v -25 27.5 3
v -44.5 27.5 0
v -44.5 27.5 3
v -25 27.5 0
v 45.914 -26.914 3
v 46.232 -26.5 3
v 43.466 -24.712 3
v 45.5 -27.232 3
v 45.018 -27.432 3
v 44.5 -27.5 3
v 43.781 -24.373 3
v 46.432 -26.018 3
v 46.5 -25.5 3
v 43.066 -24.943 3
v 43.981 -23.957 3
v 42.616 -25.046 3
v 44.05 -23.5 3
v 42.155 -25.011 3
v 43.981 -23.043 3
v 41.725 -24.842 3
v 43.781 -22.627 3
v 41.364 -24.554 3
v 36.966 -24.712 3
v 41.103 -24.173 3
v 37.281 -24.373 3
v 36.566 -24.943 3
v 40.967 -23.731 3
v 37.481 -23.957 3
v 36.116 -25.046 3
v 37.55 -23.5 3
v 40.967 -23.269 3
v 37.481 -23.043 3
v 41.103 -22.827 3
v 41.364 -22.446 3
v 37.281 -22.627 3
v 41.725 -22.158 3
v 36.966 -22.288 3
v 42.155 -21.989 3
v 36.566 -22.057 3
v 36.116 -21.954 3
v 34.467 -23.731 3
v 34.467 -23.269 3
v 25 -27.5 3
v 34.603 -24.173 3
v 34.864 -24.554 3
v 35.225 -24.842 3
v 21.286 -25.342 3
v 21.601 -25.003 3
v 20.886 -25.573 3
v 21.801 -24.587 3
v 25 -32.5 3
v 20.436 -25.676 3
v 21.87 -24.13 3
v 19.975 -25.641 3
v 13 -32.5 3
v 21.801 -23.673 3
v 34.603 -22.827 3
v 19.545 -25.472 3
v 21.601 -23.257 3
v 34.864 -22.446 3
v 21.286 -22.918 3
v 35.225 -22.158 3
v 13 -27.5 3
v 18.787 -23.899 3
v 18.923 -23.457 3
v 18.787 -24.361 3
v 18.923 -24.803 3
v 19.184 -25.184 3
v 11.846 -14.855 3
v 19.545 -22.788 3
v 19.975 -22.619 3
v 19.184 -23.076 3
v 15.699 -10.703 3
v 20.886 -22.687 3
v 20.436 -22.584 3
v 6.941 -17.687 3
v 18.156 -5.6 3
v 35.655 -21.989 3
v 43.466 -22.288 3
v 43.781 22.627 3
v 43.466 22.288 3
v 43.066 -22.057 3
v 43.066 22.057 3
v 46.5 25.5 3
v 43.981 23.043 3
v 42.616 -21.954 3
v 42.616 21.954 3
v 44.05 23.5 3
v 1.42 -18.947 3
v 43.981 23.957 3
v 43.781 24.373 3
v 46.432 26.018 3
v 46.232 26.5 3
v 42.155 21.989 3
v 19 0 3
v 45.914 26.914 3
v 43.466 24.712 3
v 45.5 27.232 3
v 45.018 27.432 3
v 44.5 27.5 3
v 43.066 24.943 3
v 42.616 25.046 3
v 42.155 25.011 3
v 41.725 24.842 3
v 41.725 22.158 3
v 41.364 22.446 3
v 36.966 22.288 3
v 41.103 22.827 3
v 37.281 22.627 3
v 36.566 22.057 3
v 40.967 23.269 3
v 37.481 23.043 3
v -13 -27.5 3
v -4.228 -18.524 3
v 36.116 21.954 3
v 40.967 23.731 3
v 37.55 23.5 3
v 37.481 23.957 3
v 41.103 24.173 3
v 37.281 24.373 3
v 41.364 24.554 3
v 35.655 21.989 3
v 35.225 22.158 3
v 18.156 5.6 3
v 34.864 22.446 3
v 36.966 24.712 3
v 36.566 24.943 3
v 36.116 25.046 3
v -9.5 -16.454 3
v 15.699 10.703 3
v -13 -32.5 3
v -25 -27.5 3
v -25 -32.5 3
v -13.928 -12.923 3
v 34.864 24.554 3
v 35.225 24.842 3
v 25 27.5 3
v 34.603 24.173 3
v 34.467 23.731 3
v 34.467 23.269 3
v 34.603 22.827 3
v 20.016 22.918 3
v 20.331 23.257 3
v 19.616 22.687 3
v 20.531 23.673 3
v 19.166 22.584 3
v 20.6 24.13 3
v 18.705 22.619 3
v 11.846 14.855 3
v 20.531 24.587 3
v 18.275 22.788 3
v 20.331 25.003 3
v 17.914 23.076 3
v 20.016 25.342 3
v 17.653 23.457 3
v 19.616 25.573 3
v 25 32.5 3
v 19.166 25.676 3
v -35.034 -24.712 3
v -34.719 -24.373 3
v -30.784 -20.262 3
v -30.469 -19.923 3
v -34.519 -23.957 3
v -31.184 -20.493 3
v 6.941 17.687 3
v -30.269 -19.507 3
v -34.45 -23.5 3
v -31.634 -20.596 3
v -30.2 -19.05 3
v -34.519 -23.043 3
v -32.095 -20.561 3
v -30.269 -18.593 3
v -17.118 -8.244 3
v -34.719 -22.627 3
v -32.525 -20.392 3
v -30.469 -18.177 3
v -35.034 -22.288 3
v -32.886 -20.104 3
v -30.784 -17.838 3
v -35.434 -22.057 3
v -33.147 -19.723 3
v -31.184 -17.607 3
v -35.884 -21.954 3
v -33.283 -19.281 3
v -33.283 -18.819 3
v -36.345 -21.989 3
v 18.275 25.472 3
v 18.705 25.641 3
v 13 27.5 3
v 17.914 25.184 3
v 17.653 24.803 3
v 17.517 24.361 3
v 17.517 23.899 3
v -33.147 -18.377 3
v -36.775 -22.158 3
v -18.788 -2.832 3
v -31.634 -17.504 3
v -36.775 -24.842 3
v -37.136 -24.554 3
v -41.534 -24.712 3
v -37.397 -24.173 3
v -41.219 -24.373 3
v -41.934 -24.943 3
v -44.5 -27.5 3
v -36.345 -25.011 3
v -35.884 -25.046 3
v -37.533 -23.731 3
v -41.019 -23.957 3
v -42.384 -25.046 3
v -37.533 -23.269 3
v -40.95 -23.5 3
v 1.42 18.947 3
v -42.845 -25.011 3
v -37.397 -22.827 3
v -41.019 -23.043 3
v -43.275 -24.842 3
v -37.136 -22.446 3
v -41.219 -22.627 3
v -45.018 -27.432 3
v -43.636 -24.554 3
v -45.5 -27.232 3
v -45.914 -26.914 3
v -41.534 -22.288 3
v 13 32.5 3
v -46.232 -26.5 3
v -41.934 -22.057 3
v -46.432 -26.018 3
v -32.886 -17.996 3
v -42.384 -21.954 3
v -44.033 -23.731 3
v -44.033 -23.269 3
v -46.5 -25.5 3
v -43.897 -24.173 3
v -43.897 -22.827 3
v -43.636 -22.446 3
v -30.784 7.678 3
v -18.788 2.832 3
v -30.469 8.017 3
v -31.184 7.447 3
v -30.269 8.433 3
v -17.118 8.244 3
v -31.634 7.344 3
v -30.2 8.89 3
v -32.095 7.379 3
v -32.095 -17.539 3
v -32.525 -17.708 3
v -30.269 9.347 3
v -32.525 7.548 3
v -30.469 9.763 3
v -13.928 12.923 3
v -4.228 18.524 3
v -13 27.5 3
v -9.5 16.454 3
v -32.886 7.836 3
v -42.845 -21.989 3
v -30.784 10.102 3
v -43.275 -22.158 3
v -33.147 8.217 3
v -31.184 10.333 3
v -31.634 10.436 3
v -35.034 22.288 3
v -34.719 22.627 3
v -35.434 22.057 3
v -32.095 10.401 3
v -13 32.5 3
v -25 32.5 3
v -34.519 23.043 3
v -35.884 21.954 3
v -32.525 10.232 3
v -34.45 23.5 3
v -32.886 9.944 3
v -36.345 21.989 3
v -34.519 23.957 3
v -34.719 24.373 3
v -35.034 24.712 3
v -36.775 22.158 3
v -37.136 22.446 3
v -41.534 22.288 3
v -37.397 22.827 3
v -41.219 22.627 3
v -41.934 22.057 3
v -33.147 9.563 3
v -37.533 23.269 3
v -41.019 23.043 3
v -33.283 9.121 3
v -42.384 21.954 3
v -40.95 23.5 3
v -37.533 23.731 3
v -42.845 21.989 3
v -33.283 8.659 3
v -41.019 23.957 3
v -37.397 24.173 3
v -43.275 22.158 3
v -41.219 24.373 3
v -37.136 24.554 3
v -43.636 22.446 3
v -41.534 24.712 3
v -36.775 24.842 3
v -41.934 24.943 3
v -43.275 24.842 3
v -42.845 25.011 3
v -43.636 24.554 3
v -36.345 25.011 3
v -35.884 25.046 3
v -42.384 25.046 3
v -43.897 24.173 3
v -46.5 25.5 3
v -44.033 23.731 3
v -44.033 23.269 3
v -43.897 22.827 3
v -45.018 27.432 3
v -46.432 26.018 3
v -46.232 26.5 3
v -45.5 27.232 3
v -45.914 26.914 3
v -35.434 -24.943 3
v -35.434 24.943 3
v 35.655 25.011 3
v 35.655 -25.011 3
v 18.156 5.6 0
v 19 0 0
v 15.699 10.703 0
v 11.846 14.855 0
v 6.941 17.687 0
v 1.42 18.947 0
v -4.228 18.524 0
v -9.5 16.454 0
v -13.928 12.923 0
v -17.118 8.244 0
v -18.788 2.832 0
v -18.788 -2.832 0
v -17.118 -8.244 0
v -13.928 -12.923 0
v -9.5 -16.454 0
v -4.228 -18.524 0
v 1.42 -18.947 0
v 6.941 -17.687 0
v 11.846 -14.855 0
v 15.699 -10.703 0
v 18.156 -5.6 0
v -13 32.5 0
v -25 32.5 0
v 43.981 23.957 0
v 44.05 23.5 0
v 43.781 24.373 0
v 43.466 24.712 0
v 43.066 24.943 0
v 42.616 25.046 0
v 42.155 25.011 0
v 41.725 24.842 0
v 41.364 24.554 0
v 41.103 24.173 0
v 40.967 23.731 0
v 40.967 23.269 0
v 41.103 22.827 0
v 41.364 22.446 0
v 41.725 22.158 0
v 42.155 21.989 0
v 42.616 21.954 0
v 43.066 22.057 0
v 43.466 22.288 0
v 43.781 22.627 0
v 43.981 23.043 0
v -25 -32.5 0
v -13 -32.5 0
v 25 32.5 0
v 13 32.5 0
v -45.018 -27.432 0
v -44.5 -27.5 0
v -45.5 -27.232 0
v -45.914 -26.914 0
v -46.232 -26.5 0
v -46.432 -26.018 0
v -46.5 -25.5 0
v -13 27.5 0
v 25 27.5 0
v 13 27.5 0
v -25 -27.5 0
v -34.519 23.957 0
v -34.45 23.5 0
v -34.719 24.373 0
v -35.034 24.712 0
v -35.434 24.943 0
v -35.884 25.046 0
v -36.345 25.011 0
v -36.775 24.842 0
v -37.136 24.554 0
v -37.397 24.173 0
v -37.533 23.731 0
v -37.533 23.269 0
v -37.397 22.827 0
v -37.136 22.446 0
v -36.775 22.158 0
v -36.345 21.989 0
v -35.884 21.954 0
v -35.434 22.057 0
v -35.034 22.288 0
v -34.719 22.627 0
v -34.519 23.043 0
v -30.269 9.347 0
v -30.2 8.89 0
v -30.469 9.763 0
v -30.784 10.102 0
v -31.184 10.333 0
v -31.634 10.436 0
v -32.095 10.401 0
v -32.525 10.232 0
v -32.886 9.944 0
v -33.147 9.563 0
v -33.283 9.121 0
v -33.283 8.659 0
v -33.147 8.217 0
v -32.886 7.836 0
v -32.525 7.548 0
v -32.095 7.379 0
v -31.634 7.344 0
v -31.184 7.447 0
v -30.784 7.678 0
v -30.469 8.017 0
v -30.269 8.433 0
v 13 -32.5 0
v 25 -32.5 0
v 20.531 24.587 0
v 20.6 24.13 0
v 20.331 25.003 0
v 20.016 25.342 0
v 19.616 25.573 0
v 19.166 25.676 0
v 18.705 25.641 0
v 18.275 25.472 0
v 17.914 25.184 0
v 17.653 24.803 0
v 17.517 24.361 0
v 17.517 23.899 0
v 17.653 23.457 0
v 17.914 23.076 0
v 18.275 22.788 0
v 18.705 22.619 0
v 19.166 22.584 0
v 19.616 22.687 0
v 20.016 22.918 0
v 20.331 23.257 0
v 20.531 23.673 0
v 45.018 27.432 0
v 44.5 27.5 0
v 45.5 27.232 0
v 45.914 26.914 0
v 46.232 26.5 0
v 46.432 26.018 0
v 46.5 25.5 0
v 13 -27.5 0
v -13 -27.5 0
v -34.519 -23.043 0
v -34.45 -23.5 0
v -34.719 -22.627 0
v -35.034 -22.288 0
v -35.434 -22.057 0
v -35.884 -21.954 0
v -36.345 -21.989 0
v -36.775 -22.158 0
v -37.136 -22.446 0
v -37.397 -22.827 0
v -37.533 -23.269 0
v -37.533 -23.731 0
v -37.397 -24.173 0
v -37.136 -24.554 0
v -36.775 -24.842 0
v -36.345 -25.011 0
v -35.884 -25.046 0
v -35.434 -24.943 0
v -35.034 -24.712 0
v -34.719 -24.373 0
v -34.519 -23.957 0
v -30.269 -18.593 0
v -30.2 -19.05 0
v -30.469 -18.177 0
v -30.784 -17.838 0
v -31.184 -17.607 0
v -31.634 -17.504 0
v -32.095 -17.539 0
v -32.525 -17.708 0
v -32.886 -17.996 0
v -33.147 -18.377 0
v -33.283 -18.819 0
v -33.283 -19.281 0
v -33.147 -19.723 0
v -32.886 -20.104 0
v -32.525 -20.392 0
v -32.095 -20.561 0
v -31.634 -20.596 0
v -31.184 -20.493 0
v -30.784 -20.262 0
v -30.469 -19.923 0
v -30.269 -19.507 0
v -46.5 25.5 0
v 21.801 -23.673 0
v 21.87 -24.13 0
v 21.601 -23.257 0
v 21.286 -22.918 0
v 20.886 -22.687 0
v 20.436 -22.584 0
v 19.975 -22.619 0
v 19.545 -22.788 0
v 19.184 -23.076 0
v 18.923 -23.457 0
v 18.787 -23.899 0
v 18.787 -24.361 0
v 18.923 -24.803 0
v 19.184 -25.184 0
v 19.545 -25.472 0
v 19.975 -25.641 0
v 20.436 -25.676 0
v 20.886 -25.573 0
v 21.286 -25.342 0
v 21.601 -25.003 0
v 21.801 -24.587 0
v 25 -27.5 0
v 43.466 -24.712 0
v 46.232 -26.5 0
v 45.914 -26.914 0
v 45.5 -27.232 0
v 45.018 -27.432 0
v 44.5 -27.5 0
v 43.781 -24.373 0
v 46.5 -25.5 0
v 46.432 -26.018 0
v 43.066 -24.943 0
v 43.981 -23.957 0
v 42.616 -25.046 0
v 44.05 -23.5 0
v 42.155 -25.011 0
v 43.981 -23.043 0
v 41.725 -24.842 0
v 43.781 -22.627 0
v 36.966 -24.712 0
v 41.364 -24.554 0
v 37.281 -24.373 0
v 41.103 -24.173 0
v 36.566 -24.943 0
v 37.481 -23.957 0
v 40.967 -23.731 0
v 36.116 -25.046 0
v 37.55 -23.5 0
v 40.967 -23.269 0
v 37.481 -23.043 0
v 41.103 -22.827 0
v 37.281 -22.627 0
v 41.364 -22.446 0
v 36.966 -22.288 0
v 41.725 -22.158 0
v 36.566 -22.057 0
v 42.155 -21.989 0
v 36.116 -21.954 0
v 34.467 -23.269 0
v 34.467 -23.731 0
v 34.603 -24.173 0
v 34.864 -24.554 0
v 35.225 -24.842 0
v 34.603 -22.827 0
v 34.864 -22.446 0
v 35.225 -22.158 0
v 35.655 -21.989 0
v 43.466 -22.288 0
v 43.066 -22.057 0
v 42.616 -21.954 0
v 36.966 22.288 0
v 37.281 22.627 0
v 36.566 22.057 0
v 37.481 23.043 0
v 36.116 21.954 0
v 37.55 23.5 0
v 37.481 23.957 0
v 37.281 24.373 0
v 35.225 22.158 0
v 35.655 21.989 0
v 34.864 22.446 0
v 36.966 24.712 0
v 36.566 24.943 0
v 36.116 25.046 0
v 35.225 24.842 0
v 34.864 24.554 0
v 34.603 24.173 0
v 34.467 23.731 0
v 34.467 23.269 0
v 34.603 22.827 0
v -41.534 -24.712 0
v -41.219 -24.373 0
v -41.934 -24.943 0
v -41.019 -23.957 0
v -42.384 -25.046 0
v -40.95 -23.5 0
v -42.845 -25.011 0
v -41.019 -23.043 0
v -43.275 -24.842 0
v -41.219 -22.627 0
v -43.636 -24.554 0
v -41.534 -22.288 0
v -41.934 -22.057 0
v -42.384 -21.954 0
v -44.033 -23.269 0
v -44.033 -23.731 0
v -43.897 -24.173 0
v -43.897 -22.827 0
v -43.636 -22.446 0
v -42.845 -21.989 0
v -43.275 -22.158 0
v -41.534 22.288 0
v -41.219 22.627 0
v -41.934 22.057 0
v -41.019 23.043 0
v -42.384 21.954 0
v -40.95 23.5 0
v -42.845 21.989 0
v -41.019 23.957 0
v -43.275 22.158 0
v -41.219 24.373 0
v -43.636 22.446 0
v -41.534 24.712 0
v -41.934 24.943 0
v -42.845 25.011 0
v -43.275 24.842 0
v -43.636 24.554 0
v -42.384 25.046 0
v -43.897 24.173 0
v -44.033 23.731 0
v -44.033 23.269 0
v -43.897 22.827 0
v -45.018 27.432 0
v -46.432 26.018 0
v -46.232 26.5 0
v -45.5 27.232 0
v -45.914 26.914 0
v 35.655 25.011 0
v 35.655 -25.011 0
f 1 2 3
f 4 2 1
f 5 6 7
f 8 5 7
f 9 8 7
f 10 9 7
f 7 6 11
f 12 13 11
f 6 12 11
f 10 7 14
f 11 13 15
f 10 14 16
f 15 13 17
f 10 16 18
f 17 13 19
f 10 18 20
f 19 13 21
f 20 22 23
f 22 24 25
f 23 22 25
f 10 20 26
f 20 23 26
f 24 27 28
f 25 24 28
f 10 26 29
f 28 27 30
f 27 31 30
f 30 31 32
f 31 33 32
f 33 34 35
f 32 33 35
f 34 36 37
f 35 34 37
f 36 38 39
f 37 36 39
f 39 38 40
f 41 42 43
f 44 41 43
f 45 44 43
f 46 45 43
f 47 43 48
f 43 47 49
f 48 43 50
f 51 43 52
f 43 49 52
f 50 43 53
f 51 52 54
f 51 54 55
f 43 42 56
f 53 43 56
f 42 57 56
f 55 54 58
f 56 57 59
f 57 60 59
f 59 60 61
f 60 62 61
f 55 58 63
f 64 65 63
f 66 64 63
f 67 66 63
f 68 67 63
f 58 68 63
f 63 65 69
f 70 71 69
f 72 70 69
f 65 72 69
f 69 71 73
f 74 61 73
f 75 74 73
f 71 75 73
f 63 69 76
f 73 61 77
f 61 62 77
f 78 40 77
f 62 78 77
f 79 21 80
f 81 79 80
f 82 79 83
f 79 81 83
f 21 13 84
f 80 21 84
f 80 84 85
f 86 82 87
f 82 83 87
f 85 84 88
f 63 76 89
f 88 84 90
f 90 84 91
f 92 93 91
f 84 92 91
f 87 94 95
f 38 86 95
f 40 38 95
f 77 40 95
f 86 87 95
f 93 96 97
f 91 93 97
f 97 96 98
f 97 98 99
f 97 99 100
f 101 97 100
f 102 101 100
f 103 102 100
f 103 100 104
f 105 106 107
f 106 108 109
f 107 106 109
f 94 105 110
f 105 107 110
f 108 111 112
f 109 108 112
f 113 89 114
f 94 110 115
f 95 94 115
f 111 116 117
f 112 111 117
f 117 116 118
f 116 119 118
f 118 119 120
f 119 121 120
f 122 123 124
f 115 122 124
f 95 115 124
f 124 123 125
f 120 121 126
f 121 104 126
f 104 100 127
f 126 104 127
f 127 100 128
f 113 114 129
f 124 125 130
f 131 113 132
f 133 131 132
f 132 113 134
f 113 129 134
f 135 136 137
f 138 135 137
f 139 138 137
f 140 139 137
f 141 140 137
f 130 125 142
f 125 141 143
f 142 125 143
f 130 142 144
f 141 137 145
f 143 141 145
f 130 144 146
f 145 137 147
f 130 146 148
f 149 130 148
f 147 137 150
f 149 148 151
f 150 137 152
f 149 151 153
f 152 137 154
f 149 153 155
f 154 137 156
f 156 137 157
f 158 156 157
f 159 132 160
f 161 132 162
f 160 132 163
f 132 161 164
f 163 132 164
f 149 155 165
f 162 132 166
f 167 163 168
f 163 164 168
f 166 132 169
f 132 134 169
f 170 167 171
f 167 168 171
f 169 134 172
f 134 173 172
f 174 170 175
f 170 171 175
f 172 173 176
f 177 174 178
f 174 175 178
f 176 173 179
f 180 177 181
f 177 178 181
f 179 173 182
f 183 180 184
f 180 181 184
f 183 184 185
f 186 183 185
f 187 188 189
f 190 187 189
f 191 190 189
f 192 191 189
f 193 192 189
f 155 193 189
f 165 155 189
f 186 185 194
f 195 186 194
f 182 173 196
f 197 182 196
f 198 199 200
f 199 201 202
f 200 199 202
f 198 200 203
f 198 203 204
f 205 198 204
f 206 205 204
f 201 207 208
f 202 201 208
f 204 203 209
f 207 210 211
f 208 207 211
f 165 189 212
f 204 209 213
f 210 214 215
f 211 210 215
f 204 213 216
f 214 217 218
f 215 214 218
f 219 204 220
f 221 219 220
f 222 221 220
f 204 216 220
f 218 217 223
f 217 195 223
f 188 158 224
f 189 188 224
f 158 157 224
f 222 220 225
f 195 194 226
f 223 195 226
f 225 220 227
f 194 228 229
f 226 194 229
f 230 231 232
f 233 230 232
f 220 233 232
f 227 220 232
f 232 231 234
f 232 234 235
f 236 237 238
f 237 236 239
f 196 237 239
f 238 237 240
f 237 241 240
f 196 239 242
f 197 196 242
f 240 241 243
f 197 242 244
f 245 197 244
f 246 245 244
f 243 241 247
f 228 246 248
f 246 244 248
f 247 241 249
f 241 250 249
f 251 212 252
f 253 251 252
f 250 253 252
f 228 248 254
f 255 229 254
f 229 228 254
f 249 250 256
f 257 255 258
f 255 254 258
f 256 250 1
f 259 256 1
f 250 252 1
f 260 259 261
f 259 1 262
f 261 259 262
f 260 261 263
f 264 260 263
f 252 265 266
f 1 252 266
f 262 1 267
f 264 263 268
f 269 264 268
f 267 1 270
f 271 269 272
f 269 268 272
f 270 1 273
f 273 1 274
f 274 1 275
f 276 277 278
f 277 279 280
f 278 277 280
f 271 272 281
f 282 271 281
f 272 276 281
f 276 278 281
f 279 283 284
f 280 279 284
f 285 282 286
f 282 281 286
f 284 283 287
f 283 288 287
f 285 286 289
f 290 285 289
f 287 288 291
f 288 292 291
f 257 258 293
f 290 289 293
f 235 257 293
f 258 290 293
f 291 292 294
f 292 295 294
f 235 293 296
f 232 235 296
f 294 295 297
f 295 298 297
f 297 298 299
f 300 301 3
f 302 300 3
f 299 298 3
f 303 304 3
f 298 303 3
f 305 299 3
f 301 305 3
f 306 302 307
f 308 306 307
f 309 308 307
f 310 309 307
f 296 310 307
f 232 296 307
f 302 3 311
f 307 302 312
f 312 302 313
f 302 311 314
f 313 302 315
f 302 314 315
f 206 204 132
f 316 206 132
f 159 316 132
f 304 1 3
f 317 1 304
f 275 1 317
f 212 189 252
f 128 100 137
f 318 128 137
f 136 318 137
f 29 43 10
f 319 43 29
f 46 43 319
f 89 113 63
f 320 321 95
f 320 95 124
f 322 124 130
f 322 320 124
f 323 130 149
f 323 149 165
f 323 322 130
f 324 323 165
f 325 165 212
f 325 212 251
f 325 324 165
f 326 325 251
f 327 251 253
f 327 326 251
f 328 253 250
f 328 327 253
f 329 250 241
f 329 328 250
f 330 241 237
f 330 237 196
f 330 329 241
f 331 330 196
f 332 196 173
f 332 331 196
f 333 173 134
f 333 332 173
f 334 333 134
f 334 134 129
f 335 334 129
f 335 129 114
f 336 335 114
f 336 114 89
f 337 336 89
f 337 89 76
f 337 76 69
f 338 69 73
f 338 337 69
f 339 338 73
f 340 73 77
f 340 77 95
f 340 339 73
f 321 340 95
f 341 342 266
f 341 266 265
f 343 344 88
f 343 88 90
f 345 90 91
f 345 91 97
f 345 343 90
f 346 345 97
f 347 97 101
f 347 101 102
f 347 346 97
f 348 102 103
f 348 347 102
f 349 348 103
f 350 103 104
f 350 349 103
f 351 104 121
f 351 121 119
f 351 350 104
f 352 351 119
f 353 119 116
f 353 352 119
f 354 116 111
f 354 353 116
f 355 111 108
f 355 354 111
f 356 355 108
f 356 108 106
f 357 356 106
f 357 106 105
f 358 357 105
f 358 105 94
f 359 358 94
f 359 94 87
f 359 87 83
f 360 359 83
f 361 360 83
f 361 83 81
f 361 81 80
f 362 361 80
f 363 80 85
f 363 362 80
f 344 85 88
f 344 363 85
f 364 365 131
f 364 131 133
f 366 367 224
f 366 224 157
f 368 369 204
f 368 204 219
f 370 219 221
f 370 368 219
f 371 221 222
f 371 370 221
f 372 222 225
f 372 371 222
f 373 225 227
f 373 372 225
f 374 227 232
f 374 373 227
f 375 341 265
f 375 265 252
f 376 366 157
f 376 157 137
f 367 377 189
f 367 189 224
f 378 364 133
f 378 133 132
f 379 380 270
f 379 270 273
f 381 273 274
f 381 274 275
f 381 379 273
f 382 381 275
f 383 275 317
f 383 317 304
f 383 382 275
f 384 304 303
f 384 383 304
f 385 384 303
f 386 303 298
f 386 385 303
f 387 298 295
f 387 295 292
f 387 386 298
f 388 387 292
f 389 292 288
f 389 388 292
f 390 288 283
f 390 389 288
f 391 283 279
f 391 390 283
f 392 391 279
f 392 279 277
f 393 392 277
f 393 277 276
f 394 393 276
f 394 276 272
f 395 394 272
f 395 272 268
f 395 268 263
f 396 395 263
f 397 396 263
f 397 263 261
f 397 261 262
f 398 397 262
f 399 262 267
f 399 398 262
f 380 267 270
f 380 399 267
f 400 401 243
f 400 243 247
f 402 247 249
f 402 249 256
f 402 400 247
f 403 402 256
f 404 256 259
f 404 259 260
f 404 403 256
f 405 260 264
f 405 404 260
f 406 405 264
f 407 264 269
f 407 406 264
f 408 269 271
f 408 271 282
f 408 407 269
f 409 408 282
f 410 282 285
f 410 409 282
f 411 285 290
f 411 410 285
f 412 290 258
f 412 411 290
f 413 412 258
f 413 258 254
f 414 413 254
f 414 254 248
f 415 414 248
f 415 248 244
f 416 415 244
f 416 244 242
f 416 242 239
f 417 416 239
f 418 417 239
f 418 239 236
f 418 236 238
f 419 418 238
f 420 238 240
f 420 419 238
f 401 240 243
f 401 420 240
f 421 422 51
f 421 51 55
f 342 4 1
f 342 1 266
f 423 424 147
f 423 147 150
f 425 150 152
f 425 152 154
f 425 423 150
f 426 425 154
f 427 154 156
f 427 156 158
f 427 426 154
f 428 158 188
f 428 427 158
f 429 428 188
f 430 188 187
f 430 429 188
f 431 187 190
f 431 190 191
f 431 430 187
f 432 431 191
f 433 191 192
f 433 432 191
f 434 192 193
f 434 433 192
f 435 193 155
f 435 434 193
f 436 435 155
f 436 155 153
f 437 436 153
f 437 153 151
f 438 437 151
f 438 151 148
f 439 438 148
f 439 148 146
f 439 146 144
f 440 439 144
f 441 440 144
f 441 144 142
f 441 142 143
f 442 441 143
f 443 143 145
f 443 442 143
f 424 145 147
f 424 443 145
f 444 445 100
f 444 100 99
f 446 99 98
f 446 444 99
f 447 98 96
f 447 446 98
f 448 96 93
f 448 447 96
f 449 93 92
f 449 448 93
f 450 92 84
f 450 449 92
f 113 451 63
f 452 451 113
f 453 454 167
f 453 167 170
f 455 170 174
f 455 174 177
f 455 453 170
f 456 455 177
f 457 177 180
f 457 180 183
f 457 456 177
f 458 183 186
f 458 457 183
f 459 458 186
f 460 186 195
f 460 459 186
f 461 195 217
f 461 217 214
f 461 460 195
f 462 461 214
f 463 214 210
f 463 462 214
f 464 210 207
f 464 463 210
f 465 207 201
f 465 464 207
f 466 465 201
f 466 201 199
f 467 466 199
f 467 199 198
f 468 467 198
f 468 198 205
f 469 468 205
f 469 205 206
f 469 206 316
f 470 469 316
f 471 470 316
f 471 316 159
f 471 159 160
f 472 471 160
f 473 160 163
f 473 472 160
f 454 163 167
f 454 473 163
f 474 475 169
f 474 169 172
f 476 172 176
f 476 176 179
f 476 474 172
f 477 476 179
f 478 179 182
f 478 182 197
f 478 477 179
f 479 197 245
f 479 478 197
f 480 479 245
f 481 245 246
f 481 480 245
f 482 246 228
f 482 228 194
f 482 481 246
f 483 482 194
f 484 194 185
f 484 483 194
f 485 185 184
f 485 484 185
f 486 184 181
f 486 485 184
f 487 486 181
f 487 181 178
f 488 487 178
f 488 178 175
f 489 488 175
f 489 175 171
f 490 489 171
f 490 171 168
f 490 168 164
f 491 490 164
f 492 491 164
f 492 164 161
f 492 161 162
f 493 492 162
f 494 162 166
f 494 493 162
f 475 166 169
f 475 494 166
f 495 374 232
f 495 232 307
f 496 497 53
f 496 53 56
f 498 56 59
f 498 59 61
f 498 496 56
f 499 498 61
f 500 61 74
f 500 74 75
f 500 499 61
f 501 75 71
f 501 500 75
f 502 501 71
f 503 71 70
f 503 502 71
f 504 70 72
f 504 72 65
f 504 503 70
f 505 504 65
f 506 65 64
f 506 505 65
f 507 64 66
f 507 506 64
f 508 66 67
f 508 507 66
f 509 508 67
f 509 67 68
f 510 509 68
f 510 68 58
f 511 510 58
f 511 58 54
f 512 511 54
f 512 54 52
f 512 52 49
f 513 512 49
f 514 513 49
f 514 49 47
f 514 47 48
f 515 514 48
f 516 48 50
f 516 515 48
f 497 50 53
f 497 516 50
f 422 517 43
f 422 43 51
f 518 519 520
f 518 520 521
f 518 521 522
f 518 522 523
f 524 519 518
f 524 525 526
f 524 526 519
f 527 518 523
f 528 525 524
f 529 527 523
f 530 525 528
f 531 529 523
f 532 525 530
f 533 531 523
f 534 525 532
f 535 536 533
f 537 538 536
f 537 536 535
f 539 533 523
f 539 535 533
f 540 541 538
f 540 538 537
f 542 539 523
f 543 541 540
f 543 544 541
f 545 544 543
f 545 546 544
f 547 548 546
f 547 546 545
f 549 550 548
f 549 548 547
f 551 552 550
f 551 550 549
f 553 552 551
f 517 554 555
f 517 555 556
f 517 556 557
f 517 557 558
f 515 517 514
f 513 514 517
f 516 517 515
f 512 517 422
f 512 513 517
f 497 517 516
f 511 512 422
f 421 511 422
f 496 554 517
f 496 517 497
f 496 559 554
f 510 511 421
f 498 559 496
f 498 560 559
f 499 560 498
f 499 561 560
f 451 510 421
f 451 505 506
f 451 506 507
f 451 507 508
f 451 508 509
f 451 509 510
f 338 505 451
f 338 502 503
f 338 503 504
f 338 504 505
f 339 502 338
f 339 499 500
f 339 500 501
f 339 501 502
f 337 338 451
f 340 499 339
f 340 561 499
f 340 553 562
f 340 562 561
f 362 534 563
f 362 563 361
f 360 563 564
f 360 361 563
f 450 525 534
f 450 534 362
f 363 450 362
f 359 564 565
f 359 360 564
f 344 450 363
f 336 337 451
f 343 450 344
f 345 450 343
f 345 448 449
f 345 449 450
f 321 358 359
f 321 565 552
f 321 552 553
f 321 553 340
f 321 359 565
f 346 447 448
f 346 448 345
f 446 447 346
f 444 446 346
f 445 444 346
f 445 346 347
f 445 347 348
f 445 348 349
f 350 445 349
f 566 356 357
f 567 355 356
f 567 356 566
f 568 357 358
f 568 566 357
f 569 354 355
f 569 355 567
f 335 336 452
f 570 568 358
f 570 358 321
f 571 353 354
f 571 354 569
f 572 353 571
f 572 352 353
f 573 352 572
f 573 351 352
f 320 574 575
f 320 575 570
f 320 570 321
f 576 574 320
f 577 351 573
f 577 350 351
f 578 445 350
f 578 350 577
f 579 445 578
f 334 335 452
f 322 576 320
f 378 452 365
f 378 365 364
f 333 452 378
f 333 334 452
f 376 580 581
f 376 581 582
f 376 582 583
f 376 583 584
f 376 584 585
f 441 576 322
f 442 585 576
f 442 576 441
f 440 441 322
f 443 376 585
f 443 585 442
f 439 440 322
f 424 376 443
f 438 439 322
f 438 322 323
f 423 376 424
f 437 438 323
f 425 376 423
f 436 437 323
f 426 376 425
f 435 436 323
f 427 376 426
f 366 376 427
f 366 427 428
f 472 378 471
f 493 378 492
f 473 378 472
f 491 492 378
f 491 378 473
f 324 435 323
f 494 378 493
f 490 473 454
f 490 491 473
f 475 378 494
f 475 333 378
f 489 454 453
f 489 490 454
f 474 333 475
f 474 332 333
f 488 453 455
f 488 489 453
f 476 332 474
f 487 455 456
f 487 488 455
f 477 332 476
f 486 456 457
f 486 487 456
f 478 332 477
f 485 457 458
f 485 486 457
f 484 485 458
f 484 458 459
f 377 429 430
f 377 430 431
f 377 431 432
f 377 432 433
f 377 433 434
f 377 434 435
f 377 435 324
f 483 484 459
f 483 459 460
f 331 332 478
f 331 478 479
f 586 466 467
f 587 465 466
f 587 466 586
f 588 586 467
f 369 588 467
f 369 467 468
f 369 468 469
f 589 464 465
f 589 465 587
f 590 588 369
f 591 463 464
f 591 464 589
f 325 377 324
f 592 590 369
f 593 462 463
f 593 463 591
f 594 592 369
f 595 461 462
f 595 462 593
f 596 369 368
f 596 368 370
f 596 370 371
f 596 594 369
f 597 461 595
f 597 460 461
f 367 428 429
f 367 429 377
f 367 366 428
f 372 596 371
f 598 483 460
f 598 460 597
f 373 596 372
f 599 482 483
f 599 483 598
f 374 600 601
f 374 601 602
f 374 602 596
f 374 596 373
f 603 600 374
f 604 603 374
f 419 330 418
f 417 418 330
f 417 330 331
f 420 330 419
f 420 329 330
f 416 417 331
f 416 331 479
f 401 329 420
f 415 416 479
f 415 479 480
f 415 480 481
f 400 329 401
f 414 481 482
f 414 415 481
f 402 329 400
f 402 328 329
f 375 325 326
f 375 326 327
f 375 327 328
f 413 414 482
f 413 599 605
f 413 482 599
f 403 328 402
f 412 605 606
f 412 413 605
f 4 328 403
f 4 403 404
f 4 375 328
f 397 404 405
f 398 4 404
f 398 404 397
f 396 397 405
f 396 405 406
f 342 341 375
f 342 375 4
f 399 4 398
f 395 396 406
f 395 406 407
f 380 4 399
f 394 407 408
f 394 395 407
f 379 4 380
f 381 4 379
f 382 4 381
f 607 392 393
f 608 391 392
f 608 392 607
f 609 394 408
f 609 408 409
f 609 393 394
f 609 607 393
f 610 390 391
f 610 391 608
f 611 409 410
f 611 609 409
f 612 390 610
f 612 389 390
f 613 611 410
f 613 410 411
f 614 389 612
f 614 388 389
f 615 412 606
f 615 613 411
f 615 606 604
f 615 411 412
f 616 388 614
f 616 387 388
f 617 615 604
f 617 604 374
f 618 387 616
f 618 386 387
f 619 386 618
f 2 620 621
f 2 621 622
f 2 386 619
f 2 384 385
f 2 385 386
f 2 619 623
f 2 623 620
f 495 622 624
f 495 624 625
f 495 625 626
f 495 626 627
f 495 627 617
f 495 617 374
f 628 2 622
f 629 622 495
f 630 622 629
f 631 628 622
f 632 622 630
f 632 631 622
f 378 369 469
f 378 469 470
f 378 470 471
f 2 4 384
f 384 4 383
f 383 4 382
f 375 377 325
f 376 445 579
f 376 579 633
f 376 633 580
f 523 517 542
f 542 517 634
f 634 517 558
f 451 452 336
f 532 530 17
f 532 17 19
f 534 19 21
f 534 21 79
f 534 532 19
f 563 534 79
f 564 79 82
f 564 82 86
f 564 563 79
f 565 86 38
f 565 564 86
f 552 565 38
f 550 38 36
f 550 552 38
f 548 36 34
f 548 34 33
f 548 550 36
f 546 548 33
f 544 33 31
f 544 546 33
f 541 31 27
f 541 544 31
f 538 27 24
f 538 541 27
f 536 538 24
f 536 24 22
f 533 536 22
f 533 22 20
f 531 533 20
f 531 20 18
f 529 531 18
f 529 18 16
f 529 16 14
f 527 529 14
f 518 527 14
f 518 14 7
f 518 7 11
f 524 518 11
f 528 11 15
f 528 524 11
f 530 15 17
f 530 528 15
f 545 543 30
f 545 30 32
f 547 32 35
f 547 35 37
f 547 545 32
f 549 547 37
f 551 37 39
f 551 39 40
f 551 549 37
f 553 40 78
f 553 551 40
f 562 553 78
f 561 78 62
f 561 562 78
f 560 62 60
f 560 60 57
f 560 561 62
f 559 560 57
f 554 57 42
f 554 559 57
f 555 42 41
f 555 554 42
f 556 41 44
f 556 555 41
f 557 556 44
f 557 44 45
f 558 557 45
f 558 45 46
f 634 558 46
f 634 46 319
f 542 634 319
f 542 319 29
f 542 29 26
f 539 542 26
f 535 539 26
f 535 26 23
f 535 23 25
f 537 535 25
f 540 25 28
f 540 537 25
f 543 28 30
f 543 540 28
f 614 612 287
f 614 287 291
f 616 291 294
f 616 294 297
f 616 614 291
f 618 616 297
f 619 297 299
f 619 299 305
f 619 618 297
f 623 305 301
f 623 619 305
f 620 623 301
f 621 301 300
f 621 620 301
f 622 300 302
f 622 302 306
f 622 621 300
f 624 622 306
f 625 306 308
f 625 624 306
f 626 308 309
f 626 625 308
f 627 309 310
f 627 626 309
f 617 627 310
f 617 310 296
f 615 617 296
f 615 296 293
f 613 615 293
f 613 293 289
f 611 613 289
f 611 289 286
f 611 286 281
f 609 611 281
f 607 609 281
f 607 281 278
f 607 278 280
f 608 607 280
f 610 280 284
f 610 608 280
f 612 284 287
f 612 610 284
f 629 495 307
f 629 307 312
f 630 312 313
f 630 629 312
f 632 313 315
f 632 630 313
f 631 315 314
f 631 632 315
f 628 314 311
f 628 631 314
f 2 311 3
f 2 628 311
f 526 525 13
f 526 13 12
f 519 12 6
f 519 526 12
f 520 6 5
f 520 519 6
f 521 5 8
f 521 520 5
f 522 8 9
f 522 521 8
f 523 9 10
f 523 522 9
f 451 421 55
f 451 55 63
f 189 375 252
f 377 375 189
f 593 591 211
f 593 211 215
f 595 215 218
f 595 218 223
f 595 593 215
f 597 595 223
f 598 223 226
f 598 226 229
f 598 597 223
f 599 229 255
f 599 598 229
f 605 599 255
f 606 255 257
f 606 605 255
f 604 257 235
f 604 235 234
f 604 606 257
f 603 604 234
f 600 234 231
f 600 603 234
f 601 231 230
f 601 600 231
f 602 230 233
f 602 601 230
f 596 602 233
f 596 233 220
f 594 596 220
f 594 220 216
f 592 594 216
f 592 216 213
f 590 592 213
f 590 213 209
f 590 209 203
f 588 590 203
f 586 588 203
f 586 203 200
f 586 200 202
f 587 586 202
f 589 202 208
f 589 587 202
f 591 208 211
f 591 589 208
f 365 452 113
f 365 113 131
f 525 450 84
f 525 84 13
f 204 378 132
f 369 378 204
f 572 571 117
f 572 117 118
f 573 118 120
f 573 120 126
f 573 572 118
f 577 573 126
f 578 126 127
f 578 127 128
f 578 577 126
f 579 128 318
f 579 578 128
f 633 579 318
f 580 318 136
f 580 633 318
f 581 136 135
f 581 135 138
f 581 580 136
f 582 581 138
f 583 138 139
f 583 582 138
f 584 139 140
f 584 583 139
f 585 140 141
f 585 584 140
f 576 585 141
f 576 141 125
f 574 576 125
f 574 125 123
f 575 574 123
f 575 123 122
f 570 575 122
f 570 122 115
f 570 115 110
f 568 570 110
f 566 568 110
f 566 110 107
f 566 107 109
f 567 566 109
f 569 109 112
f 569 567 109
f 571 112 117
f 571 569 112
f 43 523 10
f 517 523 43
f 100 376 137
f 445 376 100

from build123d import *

# Parameters (mm, degrees)
ESQUISSE1_R        = 19
ESQUISSE1_R_2      = 1.55
BOSS_EXTRU_1_DEPTH = 3


with BuildPart() as part:
    # Esquisse1 → Boss.-Extru.1 (new body)
    with BuildSketch(Plane.XY):
        with BuildLine():
            Line((-25, -32.5), (-25, -27.5))
            Line((-25, -27.5), (-44.5, -27.5))
            ThreePointArc((-44.5, -27.5), (-45.914213562, -26.914213562), (-46.5, -25.5))
            Line((-46.5, -25.5), (-46.5, 25.5))
            ThreePointArc((-46.5, 25.5), (-45.914213562, 26.914213562), (-44.5, 27.5))
            Line((-44.5, 27.5), (-25, 27.5))
            Line((-25, 27.5), (-25, 32.5))
            Line((-25, 32.5), (-13, 32.5))
            Line((-13, 32.5), (-13, 27.5))
            Line((-13, 27.5), (13, 27.5))
            Line((13, 27.5), (13, 32.5))
            Line((13, 32.5), (25, 32.5))
            Line((25, 32.5), (25, 27.5))
            Line((25, 27.5), (44.5, 27.5))
            ThreePointArc((44.5, 27.5), (45.914213562, 26.914213562), (46.5, 25.5))
            Line((46.5, 25.5), (46.5, -25.5))
            ThreePointArc((46.5, -25.5), (45.914213562, -26.914213562), (44.5, -27.5))
            Line((44.5, -27.5), (25, -27.5))
            Line((25, -27.5), (25, -32.5))
            Line((25, -32.5), (13, -32.5))
            Line((13, -32.5), (13, -27.5))
            Line((13, -27.5), (-13, -27.5))
            Line((-13, -27.5), (-13, -32.5))
            Line((-13, -32.5), (-25, -32.5))
        make_face()
        Circle(ESQUISSE1_R, mode=Mode.SUBTRACT)
        with Locations((-42.5, 23.5)):
            Circle(ESQUISSE1_R_2, mode=Mode.SUBTRACT)
        with Locations((-36, 23.5)):
            Circle(ESQUISSE1_R_2, mode=Mode.SUBTRACT)
        with Locations((-31.75, 8.89)):
            Circle(ESQUISSE1_R_2, mode=Mode.SUBTRACT)
        with Locations((-31.75, -19.05)):
            Circle(ESQUISSE1_R_2, mode=Mode.SUBTRACT)
        with Locations((-36, -23.5)):
            Circle(ESQUISSE1_R_2, mode=Mode.SUBTRACT)
        with Locations((-42.5, -23.5)):
            Circle(ESQUISSE1_R_2, mode=Mode.SUBTRACT)
        with Locations((19.05, 24.13)):
            Circle(ESQUISSE1_R_2, mode=Mode.SUBTRACT)
        with Locations((36, 23.5)):
            Circle(ESQUISSE1_R_2, mode=Mode.SUBTRACT)
        with Locations((42.5, 23.5)):
            Circle(ESQUISSE1_R_2, mode=Mode.SUBTRACT)
        with Locations((42.5, -23.5)):
            Circle(ESQUISSE1_R_2, mode=Mode.SUBTRACT)
        with Locations((36, -23.5)):
            Circle(ESQUISSE1_R_2, mode=Mode.SUBTRACT)
        with Locations((20.32, -24.13)):
            Circle(ESQUISSE1_R_2, mode=Mode.SUBTRACT)
    extrude(amount=BOSS_EXTRU_1_DEPTH)


solid = part.part
